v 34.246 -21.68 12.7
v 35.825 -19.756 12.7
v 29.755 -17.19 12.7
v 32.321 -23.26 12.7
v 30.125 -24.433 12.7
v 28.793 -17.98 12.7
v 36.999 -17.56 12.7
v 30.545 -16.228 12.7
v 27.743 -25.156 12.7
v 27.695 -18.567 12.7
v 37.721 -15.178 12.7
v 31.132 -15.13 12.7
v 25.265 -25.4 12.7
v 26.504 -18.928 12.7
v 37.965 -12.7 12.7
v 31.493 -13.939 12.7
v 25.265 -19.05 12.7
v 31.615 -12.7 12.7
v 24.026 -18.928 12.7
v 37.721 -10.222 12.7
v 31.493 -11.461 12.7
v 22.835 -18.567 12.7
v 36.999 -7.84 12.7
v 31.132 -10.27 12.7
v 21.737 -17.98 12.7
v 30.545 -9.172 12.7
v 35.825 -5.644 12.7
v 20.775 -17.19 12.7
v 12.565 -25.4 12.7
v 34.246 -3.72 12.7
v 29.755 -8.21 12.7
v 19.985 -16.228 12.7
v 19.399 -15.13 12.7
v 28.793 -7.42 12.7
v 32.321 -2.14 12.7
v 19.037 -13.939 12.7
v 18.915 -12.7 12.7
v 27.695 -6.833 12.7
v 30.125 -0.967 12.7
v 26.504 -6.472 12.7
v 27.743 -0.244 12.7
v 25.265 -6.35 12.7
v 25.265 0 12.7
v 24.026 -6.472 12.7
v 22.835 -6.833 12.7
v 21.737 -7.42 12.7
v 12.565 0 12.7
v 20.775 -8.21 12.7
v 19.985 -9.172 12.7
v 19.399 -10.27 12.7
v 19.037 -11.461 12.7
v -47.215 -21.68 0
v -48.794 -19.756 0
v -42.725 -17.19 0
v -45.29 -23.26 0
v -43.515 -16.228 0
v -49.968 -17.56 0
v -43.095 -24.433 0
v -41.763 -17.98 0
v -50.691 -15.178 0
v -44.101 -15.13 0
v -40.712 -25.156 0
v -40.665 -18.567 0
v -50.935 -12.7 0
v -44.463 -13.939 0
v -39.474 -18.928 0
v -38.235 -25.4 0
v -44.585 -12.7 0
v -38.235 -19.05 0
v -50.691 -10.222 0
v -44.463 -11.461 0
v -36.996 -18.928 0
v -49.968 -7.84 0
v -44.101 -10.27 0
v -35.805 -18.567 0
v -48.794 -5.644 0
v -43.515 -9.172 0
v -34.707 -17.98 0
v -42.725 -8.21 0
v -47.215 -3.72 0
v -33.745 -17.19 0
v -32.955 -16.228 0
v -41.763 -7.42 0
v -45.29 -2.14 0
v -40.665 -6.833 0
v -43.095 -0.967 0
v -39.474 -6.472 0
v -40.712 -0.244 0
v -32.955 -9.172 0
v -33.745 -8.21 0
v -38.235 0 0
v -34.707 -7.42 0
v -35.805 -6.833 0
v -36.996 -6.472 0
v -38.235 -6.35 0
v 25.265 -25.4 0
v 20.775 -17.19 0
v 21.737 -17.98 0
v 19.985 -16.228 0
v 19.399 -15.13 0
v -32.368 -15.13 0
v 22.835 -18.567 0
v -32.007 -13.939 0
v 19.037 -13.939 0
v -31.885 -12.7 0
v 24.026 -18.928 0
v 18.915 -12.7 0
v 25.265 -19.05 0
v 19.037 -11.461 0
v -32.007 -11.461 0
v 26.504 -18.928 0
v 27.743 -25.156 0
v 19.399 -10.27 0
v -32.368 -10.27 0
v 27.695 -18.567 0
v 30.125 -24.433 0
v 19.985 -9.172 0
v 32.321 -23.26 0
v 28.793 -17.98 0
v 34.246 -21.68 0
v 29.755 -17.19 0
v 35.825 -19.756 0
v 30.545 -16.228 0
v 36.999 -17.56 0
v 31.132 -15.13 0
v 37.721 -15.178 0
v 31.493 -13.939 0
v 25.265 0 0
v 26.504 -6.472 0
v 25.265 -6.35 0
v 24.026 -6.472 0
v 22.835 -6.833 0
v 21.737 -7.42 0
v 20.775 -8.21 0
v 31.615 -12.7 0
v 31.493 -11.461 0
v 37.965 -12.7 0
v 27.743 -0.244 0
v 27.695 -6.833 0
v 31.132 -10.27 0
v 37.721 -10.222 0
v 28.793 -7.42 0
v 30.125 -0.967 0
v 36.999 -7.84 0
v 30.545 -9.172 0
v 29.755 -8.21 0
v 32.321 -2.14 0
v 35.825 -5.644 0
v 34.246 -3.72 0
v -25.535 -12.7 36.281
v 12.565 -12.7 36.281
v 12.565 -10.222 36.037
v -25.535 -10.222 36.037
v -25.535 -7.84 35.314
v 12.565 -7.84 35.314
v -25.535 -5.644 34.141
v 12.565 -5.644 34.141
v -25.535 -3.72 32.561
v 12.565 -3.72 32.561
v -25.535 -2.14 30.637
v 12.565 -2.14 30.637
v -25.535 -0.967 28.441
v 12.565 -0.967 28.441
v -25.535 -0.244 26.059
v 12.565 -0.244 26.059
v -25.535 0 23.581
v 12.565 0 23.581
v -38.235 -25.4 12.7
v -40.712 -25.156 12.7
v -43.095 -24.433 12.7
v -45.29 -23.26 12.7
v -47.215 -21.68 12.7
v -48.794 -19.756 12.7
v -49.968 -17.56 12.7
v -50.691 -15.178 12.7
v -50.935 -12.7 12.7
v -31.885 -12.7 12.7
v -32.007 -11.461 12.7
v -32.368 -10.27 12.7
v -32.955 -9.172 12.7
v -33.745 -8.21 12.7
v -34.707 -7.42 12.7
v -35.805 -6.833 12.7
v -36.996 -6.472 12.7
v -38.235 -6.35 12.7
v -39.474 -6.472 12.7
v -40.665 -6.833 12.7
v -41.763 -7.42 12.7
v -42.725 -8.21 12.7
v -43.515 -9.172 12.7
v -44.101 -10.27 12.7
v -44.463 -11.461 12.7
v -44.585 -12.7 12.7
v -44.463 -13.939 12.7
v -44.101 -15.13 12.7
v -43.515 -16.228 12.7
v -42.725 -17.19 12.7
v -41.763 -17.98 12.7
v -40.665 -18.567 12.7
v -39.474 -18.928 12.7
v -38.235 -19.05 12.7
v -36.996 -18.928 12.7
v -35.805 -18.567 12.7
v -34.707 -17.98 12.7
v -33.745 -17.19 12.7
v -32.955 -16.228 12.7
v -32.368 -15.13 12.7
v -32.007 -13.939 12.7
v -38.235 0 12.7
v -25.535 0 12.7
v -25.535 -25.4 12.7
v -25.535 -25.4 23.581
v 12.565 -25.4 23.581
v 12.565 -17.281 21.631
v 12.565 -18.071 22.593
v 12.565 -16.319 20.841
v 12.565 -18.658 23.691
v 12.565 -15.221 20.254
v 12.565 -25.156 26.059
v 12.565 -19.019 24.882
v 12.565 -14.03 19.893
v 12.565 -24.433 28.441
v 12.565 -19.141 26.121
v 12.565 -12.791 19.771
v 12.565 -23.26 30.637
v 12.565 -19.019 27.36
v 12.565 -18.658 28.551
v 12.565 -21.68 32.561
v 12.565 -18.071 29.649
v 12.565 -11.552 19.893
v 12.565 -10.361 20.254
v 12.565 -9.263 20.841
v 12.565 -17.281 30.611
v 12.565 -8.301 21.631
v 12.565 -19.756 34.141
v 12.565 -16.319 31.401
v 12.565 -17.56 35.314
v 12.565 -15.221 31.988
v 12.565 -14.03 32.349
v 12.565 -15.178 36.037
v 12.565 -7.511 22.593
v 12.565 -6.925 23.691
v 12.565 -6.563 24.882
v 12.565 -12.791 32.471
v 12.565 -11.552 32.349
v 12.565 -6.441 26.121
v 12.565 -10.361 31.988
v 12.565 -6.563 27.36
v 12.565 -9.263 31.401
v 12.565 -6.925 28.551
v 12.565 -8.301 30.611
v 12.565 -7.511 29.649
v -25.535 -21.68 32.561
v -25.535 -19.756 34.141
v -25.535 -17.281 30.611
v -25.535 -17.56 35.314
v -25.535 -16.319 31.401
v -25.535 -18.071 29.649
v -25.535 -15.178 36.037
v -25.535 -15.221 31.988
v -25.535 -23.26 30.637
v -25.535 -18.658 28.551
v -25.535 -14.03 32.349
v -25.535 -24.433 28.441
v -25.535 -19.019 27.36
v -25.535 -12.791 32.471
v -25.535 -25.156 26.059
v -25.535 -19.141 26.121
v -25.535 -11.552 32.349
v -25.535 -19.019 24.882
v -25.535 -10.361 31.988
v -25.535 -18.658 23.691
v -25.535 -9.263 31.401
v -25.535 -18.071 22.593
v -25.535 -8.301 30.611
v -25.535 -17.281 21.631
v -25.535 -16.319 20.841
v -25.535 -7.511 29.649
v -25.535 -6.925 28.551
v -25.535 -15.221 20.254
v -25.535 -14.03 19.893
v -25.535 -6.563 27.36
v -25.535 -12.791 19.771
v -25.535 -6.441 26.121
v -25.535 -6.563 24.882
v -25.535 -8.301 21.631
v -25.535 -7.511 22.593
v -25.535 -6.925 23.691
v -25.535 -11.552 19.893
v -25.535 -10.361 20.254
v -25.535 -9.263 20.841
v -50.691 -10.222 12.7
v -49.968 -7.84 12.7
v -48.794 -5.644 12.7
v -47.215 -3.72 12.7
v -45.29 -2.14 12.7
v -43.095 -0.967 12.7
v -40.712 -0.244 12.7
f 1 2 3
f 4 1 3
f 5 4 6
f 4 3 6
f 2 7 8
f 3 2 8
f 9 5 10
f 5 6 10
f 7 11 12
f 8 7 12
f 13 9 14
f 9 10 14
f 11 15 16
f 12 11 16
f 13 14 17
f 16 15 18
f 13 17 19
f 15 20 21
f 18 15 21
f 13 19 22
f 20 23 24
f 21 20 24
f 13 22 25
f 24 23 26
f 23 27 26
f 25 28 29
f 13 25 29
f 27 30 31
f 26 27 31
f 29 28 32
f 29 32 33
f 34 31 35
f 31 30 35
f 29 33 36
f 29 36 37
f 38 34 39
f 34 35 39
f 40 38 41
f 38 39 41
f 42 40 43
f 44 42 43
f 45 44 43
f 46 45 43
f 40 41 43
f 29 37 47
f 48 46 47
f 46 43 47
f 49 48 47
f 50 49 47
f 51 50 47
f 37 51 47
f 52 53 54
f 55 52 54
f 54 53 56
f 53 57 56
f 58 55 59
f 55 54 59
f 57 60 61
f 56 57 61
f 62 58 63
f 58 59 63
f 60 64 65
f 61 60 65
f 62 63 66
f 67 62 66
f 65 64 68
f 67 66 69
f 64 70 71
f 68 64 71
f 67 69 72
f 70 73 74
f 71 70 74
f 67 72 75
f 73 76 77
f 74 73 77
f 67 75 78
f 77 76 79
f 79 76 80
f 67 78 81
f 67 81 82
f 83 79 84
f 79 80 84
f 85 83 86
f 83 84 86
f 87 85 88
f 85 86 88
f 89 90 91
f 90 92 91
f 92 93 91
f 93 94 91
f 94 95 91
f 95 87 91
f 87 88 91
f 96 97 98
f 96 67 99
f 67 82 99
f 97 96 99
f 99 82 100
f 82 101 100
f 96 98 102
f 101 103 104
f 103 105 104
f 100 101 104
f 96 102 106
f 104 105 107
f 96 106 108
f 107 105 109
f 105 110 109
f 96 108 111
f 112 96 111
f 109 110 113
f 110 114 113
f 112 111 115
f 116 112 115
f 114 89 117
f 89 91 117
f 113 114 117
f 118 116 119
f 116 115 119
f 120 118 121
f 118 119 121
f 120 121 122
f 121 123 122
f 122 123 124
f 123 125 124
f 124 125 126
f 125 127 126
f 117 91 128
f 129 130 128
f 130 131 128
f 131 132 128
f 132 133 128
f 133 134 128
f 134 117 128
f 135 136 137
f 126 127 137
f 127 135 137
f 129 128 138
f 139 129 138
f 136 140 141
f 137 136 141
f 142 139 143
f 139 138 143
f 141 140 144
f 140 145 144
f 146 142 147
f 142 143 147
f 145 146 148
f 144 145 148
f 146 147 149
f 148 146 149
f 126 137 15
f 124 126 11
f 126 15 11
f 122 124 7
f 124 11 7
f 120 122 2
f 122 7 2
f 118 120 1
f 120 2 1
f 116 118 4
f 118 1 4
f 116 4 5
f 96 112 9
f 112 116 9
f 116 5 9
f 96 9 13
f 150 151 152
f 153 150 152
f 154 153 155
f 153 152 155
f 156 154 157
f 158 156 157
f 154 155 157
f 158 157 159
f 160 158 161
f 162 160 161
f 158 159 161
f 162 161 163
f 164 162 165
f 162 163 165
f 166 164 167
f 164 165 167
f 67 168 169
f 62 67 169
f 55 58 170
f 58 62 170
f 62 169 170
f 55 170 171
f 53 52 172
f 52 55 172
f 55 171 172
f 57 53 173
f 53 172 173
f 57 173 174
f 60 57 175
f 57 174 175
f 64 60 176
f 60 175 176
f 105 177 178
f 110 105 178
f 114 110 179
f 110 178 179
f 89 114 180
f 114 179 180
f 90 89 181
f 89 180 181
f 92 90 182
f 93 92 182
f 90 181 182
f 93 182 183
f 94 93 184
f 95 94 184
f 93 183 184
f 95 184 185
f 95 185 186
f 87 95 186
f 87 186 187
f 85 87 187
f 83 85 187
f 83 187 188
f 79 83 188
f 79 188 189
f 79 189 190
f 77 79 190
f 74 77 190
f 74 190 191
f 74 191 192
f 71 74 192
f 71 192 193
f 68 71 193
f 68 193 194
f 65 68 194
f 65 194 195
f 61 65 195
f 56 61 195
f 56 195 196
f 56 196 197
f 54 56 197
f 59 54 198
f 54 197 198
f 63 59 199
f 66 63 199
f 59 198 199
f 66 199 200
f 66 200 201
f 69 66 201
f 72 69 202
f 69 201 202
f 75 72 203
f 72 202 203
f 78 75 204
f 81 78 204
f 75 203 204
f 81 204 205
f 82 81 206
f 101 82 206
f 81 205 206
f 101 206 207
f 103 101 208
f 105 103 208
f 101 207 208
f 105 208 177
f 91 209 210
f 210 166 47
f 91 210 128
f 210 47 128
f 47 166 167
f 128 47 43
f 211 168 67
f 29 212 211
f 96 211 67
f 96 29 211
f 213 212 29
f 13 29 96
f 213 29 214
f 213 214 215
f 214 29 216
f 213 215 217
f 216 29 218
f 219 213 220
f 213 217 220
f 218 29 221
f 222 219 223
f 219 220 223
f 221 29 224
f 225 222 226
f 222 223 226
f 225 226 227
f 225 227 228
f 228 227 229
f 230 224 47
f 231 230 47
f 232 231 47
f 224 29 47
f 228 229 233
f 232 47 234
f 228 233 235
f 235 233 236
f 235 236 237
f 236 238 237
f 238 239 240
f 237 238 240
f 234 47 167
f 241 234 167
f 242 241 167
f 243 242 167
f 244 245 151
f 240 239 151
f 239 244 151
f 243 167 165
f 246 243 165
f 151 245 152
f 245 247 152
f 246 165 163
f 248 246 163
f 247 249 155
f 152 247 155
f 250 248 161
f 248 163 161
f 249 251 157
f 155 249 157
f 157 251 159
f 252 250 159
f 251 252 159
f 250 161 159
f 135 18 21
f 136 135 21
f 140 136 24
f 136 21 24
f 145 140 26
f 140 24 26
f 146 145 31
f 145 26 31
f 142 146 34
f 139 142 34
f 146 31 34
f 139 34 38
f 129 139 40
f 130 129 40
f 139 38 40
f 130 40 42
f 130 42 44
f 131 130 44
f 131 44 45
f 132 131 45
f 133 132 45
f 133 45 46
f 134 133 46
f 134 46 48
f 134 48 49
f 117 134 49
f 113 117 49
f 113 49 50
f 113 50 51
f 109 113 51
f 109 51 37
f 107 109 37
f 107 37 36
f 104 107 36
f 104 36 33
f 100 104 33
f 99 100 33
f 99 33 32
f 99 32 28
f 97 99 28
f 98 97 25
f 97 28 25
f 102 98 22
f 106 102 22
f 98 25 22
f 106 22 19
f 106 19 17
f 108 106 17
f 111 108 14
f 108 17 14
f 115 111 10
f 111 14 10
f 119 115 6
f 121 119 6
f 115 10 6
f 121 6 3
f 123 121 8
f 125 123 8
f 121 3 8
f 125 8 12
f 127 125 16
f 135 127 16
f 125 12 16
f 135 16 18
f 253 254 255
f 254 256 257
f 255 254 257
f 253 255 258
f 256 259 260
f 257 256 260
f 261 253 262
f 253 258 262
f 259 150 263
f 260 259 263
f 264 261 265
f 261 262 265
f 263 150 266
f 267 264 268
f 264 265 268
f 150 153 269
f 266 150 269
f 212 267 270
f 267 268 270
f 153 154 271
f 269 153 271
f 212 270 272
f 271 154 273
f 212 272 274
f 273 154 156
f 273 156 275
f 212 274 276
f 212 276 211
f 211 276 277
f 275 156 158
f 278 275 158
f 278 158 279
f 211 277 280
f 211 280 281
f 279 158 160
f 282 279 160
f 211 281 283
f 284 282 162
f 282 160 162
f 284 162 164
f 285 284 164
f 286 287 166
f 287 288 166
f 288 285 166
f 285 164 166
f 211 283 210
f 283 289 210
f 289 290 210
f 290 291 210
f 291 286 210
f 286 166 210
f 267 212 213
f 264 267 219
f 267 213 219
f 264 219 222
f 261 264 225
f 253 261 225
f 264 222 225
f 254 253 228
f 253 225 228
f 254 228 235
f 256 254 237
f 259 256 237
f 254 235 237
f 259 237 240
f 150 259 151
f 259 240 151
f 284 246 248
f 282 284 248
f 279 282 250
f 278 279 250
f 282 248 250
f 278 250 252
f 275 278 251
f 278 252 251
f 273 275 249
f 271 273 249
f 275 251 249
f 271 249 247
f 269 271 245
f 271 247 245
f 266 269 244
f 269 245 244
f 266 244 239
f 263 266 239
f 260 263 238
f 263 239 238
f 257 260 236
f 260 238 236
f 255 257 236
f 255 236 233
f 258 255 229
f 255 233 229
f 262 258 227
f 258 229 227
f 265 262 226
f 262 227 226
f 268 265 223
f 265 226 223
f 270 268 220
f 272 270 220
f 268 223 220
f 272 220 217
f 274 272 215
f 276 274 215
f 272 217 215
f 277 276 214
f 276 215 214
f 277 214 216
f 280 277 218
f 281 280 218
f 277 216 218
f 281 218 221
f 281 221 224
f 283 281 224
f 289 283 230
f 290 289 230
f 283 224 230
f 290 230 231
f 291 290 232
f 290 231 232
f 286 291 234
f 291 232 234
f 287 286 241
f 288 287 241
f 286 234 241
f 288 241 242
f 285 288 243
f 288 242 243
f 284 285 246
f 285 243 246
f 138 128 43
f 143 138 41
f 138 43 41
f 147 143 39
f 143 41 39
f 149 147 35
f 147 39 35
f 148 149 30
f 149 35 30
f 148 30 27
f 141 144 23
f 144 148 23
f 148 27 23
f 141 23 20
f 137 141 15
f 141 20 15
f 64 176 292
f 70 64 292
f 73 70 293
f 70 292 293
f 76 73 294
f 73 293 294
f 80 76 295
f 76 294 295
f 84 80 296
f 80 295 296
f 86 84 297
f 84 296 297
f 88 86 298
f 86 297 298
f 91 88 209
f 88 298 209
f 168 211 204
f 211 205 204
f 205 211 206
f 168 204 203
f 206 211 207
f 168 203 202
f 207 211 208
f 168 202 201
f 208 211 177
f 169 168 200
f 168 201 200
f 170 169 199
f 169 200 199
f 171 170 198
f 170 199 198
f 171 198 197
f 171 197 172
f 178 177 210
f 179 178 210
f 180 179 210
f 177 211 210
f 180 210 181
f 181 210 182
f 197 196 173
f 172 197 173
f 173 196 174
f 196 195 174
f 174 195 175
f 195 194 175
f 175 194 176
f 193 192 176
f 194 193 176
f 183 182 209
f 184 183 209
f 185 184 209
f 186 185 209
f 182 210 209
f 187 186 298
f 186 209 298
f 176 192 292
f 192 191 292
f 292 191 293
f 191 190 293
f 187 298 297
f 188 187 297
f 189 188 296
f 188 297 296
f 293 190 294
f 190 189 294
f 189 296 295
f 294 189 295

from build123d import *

# Parameters (mm, degrees)
F1_DEPTH  = 25.4
F3_DEPTH  = 25.4
F5_DEPTH  = 25.4
F6_R      = 6.35
F7_DEPTH  = 25.4
F8_R      = 6.35
F9_DEPTH  = 25.4
F10_R     = 6.35
F11_DEPTH = 38.1
F13_DEPTH = 38.1


with BuildPart() as f1:
    # F0 (on Front) → F1 (new body)
    with BuildSketch(Plane.XZ):
        Polygon((-50.9347495013, 12.7), (-50.9347495013, 0), (37.9652504987, 0), (37.9652504987, 12.7), (12.5652504987, 12.7), (12.5652504987, 36.2809036063), (-25.5347495013, 36.2809036063), (-25.5347495013, 12.7), align=None)
    extrude(amount=F1_DEPTH)

    # F2 (on face) → F3 (cut)
    with BuildSketch(Plane.XY.offset(12.7)):
        with BuildLine():
            ThreePointArc((-50.9347495013, -12.7), (-47.2150056224, -3.7197438789), (-38.2347495013, 0))
            Line((-38.2347495013, 0), (-50.9347495013, 0))
            Line((-50.9347495013, 0), (-50.9347495013, -12.7))
        make_face()
        with BuildLine():
            Line((-50.9347495013, -25.4), (-38.2347495013, -25.4))
            ThreePointArc((-38.2347495013, -25.4), (-47.2150056224, -21.6802561211), (-50.9347495013, -12.7))
            Line((-50.9347495013, -12.7), (-50.9347495013, -25.4))
        make_face()
    extrude(amount=-F3_DEPTH, mode=Mode.SUBTRACT)

    # F4 (on face) → F5 (cut)
    with BuildSketch(Plane.XY.offset(12.7)):
        with BuildLine():
            ThreePointArc((25.2652504987, 0), (34.2455066198, -3.7197438789), (37.9652504987, -12.7))
            Line((37.9652504987, -12.7), (37.9652504987, 0))
            Line((37.9652504987, 0), (25.2652504987, 0))
        make_face()
        with BuildLine():
            Line((37.9652504987, -25.4), (37.9652504987, -12.7))
            ThreePointArc((37.9652504987, -12.7), (34.2455066198, -21.6802561211), (25.2652504987, -25.4))
            Line((25.2652504987, -25.4), (37.9652504987, -25.4))
        make_face()
    extrude(amount=-F5_DEPTH, mode=Mode.SUBTRACT)

    # F6 (on face) → F7 (cut)
    with BuildSketch(Plane.XY.offset(12.7)):
        with Locations((-38.2347495013, -12.7)):
            Circle(F6_R)
    extrude(amount=-F7_DEPTH, mode=Mode.SUBTRACT)

    # F8 (on face) → F9 (cut)
    with BuildSketch(Plane.XY.offset(12.7)):
        with Locations((25.2652504987, -12.7)):
            Circle(F8_R)
    extrude(amount=-F9_DEPTH, mode=Mode.SUBTRACT)

    # F10 (on face) → F11 (cut)
    with BuildSketch(Plane.YZ.offset(12.5652504987)):
        with Locations((-12.7911586314, 26.1209036063)):
            Circle(F10_R)
    extrude(amount=-F11_DEPTH, mode=Mode.SUBTRACT)

    # F12 (on face) → F13 (cut)
    with BuildSketch(Plane.YZ.offset(12.5652504987)):
        with BuildLine():
            ThreePointArc((-25.4, 23.5809036063), (-21.6802561211, 32.5611597274), (-12.7, 36.2809036063))
            Line((-12.7, 36.2809036063), (-25.4, 36.2809036063))
            Line((-25.4, 36.2809036063), (-25.4, 23.5809036063))
        make_face()
        with BuildLine():
            ThreePointArc((-12.7, 36.2809036063), (-3.7197438789, 32.5611597274), (0, 23.5809036063))
            Line((0, 23.5809036063), (0, 36.2809036063))
            Line((0, 36.2809036063), (-12.7, 36.2809036063))
        make_face()
    extrude(amount=-F13_DEPTH, mode=Mode.SUBTRACT)


solid = f1.part
